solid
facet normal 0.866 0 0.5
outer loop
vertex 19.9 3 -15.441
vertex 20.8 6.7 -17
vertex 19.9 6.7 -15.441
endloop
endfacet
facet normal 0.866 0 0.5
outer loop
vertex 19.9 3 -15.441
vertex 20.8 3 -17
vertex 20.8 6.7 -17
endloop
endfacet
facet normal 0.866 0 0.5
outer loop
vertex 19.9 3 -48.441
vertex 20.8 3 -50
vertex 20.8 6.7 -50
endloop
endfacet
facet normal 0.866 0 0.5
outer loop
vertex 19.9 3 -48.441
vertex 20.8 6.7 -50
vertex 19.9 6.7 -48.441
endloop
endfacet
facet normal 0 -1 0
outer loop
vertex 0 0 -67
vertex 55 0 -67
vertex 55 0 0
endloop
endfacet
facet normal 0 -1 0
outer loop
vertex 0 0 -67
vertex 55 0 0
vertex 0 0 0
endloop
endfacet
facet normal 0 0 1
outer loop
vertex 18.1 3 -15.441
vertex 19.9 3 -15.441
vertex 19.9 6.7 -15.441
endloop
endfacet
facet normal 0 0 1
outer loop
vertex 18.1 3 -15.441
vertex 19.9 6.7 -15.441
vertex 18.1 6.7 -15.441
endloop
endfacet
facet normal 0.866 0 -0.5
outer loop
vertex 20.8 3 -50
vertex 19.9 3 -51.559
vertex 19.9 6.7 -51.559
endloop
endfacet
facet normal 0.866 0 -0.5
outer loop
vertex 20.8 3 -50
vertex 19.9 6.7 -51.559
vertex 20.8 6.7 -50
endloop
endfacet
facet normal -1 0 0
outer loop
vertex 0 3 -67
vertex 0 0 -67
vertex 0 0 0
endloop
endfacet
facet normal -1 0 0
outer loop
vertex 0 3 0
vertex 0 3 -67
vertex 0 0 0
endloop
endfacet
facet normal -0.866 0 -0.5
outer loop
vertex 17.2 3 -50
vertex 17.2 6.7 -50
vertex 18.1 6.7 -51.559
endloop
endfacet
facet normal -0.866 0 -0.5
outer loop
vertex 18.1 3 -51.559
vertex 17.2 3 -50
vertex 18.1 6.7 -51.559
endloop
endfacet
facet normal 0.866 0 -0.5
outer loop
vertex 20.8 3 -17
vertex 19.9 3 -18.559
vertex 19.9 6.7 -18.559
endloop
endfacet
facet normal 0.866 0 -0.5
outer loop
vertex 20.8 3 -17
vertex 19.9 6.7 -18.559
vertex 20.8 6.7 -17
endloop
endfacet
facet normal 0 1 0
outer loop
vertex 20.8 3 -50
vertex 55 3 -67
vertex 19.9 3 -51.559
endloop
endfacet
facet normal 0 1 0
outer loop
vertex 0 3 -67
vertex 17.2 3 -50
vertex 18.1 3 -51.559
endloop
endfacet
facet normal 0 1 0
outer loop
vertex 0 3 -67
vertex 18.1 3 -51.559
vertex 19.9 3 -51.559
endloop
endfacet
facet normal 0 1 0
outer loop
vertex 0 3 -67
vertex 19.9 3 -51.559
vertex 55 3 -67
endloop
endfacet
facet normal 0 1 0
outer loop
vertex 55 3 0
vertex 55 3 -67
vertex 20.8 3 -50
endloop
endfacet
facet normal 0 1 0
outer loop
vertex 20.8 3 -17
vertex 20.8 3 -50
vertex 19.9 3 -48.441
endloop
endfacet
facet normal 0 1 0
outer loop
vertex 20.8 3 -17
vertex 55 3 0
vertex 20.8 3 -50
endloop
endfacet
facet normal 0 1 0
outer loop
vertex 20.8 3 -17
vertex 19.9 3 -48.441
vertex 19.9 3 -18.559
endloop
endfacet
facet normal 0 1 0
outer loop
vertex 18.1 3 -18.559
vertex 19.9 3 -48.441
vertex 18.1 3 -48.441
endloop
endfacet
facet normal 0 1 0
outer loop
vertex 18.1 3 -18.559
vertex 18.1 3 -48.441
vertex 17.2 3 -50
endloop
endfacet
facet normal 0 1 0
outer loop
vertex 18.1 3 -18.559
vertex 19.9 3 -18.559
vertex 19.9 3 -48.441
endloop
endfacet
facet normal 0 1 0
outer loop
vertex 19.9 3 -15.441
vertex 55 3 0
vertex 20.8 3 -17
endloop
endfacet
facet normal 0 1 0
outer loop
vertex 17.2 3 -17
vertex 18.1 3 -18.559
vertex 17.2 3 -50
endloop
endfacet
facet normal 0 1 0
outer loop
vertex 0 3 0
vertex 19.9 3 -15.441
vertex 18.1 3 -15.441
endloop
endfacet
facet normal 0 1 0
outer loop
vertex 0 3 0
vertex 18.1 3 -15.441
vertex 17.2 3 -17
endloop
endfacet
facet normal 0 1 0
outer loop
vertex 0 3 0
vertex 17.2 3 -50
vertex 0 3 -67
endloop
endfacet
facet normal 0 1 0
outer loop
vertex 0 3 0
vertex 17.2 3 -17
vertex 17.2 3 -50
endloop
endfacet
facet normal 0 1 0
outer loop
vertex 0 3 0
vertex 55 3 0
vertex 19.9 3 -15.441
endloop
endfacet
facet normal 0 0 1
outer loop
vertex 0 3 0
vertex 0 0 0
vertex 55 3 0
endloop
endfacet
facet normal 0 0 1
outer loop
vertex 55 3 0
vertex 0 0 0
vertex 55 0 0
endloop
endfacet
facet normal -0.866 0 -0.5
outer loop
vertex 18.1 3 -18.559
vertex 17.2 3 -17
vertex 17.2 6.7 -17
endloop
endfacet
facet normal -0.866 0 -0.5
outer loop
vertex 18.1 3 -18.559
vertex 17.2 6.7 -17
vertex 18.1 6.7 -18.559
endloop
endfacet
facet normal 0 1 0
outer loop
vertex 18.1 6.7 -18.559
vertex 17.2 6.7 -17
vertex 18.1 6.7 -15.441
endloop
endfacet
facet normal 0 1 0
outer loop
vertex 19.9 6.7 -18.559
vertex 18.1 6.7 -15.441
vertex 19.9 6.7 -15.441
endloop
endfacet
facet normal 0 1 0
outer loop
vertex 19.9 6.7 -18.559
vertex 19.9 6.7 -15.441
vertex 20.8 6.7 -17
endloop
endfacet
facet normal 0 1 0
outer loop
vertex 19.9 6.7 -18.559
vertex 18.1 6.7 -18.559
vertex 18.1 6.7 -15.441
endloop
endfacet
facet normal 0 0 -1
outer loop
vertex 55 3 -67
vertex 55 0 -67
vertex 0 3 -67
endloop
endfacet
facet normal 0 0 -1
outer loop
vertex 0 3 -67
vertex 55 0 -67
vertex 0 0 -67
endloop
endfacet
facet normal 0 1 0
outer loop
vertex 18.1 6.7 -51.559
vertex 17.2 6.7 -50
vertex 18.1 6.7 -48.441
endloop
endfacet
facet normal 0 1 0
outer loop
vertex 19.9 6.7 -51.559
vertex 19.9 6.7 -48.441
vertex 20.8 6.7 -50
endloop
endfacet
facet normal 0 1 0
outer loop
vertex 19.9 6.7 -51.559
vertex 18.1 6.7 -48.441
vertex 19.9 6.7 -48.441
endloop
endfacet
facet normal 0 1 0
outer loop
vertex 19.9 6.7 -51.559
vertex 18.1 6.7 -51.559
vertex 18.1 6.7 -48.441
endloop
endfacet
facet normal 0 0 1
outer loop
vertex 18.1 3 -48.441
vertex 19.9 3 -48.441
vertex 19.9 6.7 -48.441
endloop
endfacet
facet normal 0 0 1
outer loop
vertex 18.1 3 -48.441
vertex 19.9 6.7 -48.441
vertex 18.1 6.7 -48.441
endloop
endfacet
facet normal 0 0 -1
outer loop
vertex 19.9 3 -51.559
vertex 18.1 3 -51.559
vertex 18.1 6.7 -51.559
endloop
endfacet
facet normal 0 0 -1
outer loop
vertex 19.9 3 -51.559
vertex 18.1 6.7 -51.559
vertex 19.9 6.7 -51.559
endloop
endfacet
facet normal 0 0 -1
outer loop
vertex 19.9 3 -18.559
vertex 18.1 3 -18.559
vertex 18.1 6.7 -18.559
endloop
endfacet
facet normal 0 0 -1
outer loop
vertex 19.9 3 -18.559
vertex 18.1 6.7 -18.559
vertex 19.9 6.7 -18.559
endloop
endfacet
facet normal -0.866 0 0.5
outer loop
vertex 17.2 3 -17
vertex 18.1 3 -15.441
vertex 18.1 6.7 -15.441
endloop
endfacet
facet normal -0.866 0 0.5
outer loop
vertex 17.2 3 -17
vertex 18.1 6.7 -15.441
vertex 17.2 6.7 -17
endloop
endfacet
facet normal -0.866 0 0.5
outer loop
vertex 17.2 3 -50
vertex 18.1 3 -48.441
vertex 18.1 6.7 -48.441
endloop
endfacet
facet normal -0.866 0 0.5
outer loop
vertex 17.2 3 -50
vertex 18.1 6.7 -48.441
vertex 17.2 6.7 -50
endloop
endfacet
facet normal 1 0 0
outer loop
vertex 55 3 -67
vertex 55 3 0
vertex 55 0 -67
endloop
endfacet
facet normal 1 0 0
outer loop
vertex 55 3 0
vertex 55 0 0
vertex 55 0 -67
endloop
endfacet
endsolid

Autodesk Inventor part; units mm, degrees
ref_plane "YZ Plane" through (0, 0, 0) normal (1, 0, 0) x (0, 1, 0)
ref_plane "XZ Plane" through (0, 0, 0) normal (0, 1, 0) x (-1, 0, 0)
ref_plane "XY Plane" through (0, 0, 0) normal (0, 0, 1) x (1, 0, 0)
sketch "Sketch1" plane through (0, 0, 0) normal (0, 1, 0) x (-1, 0, 0)
  line L0 (0, 0) -> (-55, 0)
  line L1 (-55, 0) -> (-55, -67)
  line L2 (-55, -67) -> (0, -67)
  line L3 (0, -67) -> (0, 0)
  dimension "d0" = 55
  dimension "d1" = 67
extrude "Extrusion1" add sketch "Sketch1" along normal blind 3
sketch "Sketch2" plane through (0, 3, 0) normal (0, 1, 0) x (1, 0, 0)
  line L0 (55, 0) -> (55, 67) projected
  line L1 (0, 0) -> (55, 0) projected
  line L2 (20.8, 17) -> (19.9, 15.4412)
  line L3 (19.9, 15.4412) -> (18.1, 15.4412)
  line L4 (18.1, 15.4412) -> (17.2, 17)
  line L5 (17.2, 17) -> (18.1, 18.5588)
  line L6 (18.1, 18.5588) -> (19.9, 18.5588)
  line L7 (19.9, 18.5588) -> (20.8, 17)
  line L8 (20.8, 50) -> (19.9, 48.4412)
  line L9 (19.9, 48.4412) -> (18.1, 48.4412)
  line L10 (18.1, 48.4412) -> (17.2, 50)
  line L11 (17.2, 50) -> (18.1, 51.5588)
  line L12 (18.1, 51.5588) -> (19.9, 51.5588)
  line L13 (19.9, 51.5588) -> (20.8, 50)
  point P0 (19, 17)
  point P1 (19, 50)
extrude "Extrusion2" add sketch "Sketch2" along normal blind 3.7
properties part number "Star_Wars_Base"
